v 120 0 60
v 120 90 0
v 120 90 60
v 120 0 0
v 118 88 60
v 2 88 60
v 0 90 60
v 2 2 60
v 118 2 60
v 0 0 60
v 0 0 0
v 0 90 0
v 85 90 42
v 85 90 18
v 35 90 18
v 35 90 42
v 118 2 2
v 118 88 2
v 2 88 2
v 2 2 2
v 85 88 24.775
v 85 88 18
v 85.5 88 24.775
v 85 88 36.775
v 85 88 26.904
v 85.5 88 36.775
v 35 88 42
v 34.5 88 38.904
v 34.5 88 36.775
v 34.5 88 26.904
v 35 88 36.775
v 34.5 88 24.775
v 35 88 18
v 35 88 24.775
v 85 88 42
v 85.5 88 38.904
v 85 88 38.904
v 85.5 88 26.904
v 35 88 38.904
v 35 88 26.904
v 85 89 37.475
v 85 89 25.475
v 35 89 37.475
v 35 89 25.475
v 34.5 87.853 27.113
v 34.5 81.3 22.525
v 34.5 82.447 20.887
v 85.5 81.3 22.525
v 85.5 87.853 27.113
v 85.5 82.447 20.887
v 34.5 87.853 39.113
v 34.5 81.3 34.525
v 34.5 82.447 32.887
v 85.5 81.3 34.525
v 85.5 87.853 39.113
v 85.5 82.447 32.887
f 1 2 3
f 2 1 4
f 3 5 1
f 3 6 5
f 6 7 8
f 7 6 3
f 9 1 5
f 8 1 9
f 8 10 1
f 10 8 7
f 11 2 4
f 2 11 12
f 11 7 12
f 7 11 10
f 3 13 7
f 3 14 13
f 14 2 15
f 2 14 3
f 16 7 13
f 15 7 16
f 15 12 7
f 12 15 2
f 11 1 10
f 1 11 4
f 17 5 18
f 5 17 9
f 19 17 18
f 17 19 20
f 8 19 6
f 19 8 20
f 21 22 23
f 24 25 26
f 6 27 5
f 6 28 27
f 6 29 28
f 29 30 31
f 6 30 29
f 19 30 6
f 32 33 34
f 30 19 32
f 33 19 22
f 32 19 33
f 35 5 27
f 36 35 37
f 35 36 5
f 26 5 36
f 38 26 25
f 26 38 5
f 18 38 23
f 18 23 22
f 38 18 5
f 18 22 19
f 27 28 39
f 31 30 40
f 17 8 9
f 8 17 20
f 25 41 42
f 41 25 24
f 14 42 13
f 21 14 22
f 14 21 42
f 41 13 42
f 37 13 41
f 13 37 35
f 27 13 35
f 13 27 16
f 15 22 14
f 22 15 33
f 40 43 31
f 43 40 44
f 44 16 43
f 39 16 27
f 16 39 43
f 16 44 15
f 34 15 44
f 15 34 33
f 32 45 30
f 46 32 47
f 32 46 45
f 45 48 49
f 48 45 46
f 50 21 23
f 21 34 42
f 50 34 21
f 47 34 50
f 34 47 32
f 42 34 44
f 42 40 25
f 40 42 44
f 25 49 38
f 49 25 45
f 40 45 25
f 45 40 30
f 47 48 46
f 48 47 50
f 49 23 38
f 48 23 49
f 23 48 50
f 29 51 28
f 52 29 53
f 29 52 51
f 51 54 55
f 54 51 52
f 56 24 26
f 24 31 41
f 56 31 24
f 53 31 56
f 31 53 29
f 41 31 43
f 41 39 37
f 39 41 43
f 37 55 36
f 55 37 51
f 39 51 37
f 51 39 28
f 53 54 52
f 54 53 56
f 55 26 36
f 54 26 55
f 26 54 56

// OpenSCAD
$fn = 32;

// ----------------------------------------------------------------------
// Vent box: louvers enclosure
// ----------------------------------------------------------------------

// --- parameters (mm) ---
box_l = 120;              // box length, X
box_w = 90;               // box width, Y
box_h = 60;               // box height, Z
wall_t = 2;               // shell wall thickness
win_l = 50;               // vent window width, X
win_h = 24;               // vent window height, Z
slat_t = 2;               // louver slat thickness
slat_d = 8;               // louver slat depth
slat_a = 35;              // louver slat angle, degrees
slat_pitch = 12;          // louver pitch
slat_yc = 85.15;          // slat centreline Y
fit_tol = 0.1;            // tolerance for press fits, mm
free_tol = 0.3;           // tolerance for clearance fits, mm

win_z0 = (box_h - win_h) / 2;  // window lower edge Z
n_slats = 2;  // louver count
slat_z0 = win_z0 + (win_h - (n_slats - 1) * slat_pitch) / 2;

difference() {
  union() {
    difference() {
      cube([box_l, box_w, box_h]);
  translate([wall_t, wall_t, wall_t])
    cube([box_l - 2 * wall_t, box_w - 2 * wall_t, box_h]);
  translate([(box_l - win_l) / 2, box_w - wall_t - 1, win_z0])
    cube([win_l, wall_t + 2, win_h]);
    }
    for (i = [0 : n_slats - 1])
      translate([box_l / 2, slat_yc, slat_z0 + i * slat_pitch])
        rotate([slat_a, 0, 0])
          cube([win_l + 1, slat_d, slat_t], center = true);
  }
}
